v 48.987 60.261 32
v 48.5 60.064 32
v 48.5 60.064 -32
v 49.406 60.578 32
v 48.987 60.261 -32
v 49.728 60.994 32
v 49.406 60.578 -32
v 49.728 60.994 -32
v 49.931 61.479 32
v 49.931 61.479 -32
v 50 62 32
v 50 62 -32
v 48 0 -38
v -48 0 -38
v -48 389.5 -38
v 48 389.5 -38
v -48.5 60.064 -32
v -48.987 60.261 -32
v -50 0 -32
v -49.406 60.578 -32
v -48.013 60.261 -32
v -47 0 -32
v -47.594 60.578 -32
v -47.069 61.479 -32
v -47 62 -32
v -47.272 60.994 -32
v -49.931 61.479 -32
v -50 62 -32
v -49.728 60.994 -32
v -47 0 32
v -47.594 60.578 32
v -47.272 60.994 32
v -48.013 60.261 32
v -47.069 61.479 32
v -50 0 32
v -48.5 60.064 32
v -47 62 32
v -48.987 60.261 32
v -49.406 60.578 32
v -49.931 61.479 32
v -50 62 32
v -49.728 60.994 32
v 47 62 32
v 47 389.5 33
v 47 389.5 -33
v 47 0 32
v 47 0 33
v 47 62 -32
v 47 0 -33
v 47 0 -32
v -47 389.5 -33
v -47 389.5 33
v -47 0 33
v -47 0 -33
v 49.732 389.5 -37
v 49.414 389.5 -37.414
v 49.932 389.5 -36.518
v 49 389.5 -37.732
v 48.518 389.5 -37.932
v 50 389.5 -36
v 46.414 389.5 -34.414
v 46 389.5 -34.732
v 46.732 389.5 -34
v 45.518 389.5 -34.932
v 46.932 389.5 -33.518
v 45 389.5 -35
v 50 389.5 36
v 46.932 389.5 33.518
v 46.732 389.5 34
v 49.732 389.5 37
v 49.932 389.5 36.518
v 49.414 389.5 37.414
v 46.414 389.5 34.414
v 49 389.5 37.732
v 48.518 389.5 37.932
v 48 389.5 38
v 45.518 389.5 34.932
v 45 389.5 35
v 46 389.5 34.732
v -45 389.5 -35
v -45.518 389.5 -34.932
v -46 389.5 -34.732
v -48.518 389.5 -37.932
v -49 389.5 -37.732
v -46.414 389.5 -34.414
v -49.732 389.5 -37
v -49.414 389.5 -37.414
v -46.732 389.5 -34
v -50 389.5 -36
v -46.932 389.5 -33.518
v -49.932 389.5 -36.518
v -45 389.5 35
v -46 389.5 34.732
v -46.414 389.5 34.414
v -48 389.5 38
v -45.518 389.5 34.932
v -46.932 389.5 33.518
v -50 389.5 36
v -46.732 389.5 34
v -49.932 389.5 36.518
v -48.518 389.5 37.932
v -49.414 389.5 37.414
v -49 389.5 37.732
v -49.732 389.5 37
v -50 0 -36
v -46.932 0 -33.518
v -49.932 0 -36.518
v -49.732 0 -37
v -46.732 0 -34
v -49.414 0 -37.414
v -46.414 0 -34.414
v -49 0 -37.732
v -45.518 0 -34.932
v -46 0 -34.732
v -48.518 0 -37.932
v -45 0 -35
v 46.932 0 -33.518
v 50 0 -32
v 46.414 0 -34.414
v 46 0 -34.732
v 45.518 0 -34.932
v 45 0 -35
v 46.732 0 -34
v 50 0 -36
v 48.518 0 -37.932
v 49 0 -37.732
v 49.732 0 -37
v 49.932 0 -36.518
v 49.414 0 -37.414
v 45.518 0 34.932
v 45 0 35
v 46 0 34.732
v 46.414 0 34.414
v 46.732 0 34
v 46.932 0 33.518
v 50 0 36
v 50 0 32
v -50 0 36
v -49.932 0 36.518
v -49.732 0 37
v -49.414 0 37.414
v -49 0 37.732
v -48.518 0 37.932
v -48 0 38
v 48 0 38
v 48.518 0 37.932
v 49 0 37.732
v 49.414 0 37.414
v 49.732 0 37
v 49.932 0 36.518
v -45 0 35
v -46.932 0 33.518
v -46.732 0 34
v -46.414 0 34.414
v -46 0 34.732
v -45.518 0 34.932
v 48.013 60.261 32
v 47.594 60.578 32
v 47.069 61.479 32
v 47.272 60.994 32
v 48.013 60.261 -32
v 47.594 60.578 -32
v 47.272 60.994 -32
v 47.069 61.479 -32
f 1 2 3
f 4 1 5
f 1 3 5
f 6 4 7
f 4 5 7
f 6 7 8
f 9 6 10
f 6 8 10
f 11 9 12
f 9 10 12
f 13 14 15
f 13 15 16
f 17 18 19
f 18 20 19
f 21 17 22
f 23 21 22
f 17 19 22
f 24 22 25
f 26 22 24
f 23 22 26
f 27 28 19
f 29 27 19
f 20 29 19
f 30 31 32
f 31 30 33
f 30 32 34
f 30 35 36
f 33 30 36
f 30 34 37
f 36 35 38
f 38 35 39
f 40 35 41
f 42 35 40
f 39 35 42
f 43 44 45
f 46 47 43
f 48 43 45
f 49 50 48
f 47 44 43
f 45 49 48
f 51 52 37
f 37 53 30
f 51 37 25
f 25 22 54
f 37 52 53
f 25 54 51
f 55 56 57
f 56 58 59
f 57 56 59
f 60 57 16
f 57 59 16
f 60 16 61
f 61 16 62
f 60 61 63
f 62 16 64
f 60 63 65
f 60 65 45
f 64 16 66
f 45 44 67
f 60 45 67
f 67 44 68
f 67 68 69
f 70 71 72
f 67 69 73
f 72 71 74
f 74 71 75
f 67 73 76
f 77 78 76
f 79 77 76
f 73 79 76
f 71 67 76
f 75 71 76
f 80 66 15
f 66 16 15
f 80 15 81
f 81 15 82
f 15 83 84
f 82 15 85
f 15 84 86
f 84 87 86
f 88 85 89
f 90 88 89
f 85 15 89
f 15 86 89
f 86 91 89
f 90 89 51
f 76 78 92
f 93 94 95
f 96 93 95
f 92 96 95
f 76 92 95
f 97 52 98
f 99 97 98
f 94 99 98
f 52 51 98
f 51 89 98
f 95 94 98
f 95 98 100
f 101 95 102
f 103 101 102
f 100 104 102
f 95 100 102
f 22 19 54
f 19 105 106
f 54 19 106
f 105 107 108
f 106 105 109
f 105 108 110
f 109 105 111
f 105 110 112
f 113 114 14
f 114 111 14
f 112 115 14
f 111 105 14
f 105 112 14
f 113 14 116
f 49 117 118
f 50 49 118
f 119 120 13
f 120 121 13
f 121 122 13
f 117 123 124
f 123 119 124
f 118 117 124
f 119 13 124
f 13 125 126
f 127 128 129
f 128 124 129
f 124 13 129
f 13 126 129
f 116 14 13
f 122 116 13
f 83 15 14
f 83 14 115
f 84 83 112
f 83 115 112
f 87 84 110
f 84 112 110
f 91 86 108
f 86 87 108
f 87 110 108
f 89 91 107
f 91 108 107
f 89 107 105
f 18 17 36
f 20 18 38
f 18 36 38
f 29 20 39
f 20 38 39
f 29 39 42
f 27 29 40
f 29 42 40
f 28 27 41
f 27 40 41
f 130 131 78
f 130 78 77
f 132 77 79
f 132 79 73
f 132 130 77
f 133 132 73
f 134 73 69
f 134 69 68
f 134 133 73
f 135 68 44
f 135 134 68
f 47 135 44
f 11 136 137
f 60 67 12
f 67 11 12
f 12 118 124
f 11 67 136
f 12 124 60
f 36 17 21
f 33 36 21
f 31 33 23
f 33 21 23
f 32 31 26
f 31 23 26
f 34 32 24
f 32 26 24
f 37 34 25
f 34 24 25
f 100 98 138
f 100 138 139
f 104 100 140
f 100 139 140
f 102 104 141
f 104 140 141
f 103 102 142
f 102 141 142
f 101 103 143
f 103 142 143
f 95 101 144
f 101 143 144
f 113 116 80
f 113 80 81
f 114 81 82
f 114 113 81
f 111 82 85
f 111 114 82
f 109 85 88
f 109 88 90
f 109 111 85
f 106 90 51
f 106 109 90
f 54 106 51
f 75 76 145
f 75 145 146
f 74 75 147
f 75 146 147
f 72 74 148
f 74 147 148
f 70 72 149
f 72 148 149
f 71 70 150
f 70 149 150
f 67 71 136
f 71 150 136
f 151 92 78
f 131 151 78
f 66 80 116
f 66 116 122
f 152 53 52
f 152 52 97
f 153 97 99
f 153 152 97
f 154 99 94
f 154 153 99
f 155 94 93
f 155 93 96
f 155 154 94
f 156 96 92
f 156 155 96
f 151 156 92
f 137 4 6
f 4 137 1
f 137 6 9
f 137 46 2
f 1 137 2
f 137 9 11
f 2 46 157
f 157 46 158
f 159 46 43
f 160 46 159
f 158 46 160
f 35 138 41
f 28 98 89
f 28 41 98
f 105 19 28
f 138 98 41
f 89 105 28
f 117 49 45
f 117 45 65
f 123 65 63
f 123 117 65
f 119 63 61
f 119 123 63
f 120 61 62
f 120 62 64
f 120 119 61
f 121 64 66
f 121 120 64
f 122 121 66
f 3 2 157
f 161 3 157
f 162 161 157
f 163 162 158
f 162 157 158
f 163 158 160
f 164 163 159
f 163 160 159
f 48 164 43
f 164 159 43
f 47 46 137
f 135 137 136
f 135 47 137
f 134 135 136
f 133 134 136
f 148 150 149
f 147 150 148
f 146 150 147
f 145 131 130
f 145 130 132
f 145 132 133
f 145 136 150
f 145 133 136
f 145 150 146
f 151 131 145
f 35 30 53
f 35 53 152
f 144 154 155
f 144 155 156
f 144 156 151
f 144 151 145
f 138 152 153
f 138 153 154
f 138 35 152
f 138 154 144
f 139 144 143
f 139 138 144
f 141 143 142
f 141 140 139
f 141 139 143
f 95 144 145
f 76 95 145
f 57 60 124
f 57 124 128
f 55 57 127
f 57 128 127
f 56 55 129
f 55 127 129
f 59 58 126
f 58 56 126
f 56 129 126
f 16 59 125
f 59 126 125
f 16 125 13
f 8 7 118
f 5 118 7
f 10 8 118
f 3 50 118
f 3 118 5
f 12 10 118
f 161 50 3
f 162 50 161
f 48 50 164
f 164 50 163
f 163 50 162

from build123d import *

# Parameters (mm, degrees)
SKETCH1_W               = 100
SKETCH1_H               = 76
SKETCH1_W_2             = 94
SKETCH1_H_2             = 70
BOSS_EXTRUDE1_DEPTH     = 389.5
CUT_EXTRUDE1_DEPTH      = 395.530417078
CUT_EXTRUDE1_DEPTH_BACK = 395.530417078
SKETCH4_W               = 64
SKETCH4_H               = 60
FILLET1_R               = 2


with BuildPart() as part:
    # Sketch1 → Boss-Extrude1 (new body)
    with BuildSketch(Plane(origin=(0, 0, 0), x_dir=(1, 0, 0), z_dir=(0, 1, 0))):
        Rectangle(SKETCH1_W, SKETCH1_H)
        Rectangle(SKETCH1_W_2, SKETCH1_H_2, mode=Mode.SUBTRACT)
    extrude(amount=BOSS_EXTRUDE1_DEPTH)

    # Sketch4 → Cut-Extrude1 (cut, two sides: drawn at the far end of the back side and taken through both)
    with BuildSketch(Plane(origin=(0, 0, 0), x_dir=(0, 0, -1), z_dir=(1, 0, 0)).offset(-CUT_EXTRUDE1_DEPTH_BACK)):
        with Locations((0, 30)):
            Rectangle(SKETCH4_W, SKETCH4_H)
    extrude(amount=CUT_EXTRUDE1_DEPTH + CUT_EXTRUDE1_DEPTH_BACK, mode=Mode.SUBTRACT)

    # Fillet1
    # the kernel refuses this fillet: 2 mm, written as the material it adds along each edge
    with BuildSketch(Plane(origin=(47, 0, 35), x_dir=(0, 0, -1), z_dir=(0, 1, 0))) as fillet1_piece_1:
        with BuildLine():
            CenterArc((FILLET1_R, FILLET1_R), FILLET1_R, 180, 90)
            Line((0, FILLET1_R), (0, 0))
            Line((0, 0), (FILLET1_R, 0))
        make_face()
    extrude(amount=389.5)
    with BuildSketch(Plane(origin=(-47, 0, 35), x_dir=(0, 0, -1), z_dir=(0, 1, 0)), Plane(origin=(47, 0, -35), x_dir=(0, 0, 1), z_dir=(0, 1, 0)), Plane(origin=(-47, 0, -35), x_dir=(1, 0, 0), z_dir=(0, 1, 0))) as fillet1_piece_2:
        with BuildLine():
            CenterArc((FILLET1_R, -FILLET1_R), FILLET1_R, 90, 90)
            Line((0, -FILLET1_R), (0, 0))
            Line((0, 0), (FILLET1_R, 0))
        make_face()
    extrude(amount=389.5)
    # the kernel refuses this fillet: 2 mm, written as the material it takes off along each edge
    with BuildSketch(Plane(origin=(50, -5, -38), x_dir=(-1, 0, 0), z_dir=(0, 1, 0)), Plane(origin=(-50, -5, -38), x_dir=(0, 0, 1), z_dir=(0, 1, 0))) as fillet1_2_piece_1:
        with BuildLine():
            CenterArc((FILLET1_R, FILLET1_R), FILLET1_R, 180, 90)
            Line((0, FILLET1_R), (0, 0))
            Line((0, 0), (FILLET1_R, 0))
        make_face()
    extrude(amount=399.5, mode=Mode.SUBTRACT)
    with BuildSketch(Plane(origin=(-50, -5, 38), x_dir=(0, 0, -1), z_dir=(0, 1, 0)), Plane(origin=(50, -5, 38), x_dir=(-1, 0, 0), z_dir=(0, 1, 0))) as fillet1_2_piece_2:
        with BuildLine():
            CenterArc((FILLET1_R, -FILLET1_R), FILLET1_R, 90, 90)
            Line((0, -FILLET1_R), (0, 0))
            Line((0, 0), (FILLET1_R, 0))
        make_face()
    extrude(amount=399.5, mode=Mode.SUBTRACT)
    with BuildSketch(Plane(origin=(-50, 60, 32), x_dir=(0, 1, 0), z_dir=(0, 0, -1)), Plane(origin=(50, 60, -32), x_dir=(0, 1, 0), z_dir=(0, 0, 1)), Plane(origin=(47, 60, 32), x_dir=(0, 1, 0), z_dir=(0, 0, -1))) as fillet1_2_piece_3:
        with BuildLine():
            CenterArc((FILLET1_R, FILLET1_R), FILLET1_R, 180, 90)
            Line((0, FILLET1_R), (0, 0))
            Line((0, 0), (FILLET1_R, 0))
        make_face()
    extrude(amount=64, mode=Mode.SUBTRACT)
    with BuildSketch(Plane(origin=(-47, 60, -32), x_dir=(-1, 0, 0), z_dir=(0, 0, 1))) as fillet1_2_piece_4:
        with BuildLine():
            CenterArc((FILLET1_R, -FILLET1_R), FILLET1_R, 90, 90)
            Line((0, -FILLET1_R), (0, 0))
            Line((0, 0), (FILLET1_R, 0))
        make_face()
    extrude(amount=64, mode=Mode.SUBTRACT)


solid = part.part
